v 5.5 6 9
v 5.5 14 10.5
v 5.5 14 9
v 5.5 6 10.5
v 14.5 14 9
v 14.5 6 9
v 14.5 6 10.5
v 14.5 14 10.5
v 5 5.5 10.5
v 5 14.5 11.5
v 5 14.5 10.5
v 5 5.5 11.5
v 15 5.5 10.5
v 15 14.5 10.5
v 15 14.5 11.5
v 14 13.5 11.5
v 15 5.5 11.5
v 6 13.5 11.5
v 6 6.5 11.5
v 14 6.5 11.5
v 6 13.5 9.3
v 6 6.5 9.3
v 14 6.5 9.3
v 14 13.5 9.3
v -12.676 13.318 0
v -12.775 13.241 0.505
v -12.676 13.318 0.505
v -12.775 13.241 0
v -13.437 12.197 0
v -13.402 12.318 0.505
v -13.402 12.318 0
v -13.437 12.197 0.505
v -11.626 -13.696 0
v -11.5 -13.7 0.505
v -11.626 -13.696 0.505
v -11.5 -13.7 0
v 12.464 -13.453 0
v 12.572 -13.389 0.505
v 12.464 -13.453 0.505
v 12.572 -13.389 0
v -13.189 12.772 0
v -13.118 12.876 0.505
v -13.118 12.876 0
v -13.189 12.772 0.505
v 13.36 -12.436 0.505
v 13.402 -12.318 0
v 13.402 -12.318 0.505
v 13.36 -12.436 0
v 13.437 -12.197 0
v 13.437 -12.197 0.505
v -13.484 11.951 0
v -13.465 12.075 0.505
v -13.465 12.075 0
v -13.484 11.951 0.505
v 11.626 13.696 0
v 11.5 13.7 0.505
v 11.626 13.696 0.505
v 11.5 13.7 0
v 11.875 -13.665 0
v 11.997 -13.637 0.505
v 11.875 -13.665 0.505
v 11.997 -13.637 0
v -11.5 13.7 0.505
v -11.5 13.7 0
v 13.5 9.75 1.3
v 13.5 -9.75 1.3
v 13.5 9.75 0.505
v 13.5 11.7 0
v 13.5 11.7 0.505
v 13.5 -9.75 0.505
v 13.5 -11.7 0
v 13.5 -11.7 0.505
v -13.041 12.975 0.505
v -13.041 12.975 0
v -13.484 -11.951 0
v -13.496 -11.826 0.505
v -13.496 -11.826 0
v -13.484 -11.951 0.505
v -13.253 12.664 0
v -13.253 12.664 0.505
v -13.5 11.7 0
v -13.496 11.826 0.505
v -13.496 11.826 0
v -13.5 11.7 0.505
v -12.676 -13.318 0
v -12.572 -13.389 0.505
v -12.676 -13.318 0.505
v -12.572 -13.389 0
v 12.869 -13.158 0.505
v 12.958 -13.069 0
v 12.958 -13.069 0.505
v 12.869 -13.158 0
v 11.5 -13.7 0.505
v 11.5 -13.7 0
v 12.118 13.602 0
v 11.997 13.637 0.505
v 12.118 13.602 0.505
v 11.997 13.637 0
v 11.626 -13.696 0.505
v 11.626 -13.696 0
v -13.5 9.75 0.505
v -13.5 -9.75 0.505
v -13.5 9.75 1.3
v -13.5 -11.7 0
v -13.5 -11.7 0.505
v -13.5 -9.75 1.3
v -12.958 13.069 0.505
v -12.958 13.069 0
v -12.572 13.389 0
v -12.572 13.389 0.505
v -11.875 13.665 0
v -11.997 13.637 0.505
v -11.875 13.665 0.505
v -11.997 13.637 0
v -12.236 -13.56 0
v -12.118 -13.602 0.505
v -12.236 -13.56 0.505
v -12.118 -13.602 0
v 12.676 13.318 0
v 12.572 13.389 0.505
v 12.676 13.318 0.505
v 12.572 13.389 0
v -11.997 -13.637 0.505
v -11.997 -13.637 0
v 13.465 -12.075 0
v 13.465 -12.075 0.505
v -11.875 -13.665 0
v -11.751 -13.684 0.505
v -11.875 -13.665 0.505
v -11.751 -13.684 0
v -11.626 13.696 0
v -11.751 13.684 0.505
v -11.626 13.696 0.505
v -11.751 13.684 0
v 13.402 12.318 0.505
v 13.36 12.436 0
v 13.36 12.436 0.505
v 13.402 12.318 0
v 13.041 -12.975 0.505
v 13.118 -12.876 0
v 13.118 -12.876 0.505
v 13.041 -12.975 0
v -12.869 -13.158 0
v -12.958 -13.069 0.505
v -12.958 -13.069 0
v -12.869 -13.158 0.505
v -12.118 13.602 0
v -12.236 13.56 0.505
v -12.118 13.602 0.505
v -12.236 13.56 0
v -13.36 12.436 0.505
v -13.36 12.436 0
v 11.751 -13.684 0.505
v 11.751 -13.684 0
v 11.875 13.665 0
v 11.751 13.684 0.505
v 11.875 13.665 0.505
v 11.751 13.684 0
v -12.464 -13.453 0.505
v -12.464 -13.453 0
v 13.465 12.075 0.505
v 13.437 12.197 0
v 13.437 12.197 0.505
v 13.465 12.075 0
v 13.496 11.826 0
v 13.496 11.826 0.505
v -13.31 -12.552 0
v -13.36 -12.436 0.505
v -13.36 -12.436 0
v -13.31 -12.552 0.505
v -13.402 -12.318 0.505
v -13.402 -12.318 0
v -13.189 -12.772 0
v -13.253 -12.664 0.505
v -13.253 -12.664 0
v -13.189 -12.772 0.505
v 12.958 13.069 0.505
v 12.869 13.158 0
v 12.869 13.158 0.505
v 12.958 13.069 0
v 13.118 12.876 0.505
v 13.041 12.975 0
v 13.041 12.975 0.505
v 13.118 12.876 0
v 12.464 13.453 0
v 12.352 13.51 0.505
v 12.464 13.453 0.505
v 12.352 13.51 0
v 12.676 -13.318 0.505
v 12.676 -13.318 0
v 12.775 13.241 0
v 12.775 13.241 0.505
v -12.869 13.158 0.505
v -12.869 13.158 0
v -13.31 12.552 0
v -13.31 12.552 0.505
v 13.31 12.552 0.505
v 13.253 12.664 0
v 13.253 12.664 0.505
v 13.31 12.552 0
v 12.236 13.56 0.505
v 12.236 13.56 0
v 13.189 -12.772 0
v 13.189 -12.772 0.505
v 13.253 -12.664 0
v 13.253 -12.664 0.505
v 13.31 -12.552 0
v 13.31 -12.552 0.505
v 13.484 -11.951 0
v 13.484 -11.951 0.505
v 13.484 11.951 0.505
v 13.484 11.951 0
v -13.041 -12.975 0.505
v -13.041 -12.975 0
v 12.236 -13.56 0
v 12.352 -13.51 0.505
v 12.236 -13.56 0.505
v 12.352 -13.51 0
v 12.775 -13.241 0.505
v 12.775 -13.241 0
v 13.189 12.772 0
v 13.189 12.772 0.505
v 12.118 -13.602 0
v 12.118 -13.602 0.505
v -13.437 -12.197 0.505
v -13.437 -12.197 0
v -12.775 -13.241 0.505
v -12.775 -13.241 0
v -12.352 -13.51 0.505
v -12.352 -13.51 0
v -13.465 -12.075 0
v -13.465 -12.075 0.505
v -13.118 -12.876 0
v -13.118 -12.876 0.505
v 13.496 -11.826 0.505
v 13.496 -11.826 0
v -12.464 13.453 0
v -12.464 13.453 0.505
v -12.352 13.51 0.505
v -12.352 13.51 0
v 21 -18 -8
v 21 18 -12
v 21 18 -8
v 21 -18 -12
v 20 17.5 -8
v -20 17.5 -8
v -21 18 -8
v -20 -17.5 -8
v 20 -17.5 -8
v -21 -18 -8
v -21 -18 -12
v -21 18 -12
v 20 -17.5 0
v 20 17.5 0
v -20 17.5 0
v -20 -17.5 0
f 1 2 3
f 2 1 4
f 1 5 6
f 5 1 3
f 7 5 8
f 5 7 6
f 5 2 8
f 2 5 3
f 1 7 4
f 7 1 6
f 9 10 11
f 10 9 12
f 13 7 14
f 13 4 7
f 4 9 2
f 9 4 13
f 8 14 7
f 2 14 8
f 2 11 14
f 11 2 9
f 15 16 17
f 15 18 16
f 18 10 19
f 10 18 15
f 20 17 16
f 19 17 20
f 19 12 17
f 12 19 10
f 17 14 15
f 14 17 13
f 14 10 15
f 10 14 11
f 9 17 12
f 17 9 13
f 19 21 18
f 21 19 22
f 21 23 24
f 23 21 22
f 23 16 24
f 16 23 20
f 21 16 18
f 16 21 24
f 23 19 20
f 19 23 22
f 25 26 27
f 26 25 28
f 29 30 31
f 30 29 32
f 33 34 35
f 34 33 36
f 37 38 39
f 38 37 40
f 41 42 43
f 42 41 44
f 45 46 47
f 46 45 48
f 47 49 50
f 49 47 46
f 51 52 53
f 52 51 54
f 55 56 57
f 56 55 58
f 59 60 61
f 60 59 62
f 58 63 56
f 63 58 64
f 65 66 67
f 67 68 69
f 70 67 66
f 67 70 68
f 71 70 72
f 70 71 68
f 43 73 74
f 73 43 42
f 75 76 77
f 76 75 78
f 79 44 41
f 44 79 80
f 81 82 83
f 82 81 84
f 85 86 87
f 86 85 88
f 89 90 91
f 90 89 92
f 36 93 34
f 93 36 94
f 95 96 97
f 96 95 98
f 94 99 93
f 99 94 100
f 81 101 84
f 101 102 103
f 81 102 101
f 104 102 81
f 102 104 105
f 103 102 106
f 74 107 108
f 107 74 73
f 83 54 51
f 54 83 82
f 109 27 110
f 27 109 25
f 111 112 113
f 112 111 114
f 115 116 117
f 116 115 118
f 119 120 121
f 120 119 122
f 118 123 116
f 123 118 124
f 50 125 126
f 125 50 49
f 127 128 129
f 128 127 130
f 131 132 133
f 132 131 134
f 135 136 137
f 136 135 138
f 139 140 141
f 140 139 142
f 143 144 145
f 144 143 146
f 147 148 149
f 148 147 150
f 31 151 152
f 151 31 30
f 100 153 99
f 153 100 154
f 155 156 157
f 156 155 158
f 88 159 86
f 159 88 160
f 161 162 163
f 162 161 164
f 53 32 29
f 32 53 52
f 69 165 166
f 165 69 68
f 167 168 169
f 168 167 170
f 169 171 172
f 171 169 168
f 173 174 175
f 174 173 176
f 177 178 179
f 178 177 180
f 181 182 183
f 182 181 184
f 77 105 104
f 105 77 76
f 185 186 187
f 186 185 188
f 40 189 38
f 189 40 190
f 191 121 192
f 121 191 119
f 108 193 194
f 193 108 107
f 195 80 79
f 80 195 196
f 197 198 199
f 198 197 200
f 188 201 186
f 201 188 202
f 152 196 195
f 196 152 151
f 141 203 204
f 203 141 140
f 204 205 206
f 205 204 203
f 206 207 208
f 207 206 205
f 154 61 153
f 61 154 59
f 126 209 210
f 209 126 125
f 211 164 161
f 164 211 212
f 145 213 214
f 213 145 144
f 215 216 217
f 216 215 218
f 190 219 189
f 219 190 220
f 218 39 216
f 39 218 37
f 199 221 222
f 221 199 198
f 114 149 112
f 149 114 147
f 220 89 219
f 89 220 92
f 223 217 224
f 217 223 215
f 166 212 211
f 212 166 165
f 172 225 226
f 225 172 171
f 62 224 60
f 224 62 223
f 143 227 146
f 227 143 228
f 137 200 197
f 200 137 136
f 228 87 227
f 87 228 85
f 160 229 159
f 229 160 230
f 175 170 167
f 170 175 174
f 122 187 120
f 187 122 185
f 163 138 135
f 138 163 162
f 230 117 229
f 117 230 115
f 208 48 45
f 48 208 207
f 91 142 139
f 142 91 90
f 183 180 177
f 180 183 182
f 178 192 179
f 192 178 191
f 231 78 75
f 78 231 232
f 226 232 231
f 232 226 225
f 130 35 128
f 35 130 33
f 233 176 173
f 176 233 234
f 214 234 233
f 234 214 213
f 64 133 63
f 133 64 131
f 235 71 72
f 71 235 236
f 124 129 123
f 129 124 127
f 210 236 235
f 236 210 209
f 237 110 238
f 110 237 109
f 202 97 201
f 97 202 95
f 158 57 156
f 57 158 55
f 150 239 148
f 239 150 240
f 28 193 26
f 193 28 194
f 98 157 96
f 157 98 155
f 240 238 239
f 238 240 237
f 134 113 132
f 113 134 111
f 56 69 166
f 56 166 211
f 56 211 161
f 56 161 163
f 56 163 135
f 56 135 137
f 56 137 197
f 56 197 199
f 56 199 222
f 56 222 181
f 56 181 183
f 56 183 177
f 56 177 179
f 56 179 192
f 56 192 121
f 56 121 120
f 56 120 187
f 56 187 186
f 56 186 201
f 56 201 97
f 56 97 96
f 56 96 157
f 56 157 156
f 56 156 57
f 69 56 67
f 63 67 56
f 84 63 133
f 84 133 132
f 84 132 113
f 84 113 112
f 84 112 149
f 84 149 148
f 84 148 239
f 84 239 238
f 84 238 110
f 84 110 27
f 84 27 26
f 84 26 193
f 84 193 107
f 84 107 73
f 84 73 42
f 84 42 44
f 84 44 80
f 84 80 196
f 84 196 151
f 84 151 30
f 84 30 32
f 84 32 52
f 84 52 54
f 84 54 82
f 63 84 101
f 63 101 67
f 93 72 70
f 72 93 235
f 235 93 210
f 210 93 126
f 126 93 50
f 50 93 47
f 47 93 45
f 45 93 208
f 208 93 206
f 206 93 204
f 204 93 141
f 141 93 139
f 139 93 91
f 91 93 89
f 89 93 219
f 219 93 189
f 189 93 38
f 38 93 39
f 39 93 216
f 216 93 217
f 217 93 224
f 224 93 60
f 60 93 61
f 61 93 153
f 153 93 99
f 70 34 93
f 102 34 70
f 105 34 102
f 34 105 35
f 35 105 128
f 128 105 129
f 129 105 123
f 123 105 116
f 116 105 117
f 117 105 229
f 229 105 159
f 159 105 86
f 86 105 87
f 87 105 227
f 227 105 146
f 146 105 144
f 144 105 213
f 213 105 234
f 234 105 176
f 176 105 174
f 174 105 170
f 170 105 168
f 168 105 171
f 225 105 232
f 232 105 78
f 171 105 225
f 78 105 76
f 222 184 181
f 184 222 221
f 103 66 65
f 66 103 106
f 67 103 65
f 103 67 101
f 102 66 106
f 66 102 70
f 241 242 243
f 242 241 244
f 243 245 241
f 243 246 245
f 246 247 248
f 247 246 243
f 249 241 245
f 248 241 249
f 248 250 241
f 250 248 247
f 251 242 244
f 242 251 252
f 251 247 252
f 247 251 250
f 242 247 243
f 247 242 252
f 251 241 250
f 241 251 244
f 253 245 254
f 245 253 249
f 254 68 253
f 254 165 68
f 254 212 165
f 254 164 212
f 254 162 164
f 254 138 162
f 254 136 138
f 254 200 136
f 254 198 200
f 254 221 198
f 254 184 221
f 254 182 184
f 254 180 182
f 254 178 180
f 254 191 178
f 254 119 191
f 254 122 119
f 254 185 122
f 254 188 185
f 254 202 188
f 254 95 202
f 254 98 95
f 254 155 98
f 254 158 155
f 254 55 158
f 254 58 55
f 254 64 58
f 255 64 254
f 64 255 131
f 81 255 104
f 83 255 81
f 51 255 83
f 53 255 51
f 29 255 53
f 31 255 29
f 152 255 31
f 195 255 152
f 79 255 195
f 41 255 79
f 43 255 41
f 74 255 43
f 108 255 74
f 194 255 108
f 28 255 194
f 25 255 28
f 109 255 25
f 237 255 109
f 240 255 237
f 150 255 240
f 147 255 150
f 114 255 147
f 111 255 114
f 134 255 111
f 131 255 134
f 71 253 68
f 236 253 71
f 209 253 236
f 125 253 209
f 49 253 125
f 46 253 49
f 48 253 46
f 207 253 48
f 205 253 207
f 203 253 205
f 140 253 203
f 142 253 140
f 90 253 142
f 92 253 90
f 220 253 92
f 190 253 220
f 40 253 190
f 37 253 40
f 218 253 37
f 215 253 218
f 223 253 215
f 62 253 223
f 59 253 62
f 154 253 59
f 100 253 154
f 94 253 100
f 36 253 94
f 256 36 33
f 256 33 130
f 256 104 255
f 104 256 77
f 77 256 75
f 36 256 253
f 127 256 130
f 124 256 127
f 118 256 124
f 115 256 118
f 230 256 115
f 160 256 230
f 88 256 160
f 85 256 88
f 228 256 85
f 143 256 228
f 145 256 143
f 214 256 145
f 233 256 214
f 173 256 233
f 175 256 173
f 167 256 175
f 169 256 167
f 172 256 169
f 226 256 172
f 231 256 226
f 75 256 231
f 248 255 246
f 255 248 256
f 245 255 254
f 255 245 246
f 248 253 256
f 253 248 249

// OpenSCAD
// file: module/battery.scad
module battery()
    color("silver") cube([42,36,4], true);
    
battery();
// file: module/button.scad
module button() {
    color("red") difference() {
        union() {
            cube([9,8,2], center=true);
            translate([0,0,-1]) cube([10,9,1], center=true);
        }
        translate([0,0,-0.8]) cube([8,7,3], center=true);
    }
}
rotate([180,0,0]) button();
// file: module/oled.scad
module oled() {
    color("Steelblue", 1) minkowski() {
        cube([23,23.4,1], center=true);
        cylinder(r=2,h=0.01, center=true);
    }
    color("Grey", 1) translate([0,0,0.9]) cube([27,19.5,0.8], center=true);
}
// main file
//TODO: Datei sinnvoll umbennen

$fn=100; //Decrease to increase rendering speed

use <module/oled.scad>;
use <module/button.scad>;
use <module/battery.scad>;

translate([10,10,10]) rotate([0,180,0]) button();
oled();
translate([0,0,-10]) battery();
translate([0,0,-5]) color("red") cube([40,35,10], true); //Electronics
